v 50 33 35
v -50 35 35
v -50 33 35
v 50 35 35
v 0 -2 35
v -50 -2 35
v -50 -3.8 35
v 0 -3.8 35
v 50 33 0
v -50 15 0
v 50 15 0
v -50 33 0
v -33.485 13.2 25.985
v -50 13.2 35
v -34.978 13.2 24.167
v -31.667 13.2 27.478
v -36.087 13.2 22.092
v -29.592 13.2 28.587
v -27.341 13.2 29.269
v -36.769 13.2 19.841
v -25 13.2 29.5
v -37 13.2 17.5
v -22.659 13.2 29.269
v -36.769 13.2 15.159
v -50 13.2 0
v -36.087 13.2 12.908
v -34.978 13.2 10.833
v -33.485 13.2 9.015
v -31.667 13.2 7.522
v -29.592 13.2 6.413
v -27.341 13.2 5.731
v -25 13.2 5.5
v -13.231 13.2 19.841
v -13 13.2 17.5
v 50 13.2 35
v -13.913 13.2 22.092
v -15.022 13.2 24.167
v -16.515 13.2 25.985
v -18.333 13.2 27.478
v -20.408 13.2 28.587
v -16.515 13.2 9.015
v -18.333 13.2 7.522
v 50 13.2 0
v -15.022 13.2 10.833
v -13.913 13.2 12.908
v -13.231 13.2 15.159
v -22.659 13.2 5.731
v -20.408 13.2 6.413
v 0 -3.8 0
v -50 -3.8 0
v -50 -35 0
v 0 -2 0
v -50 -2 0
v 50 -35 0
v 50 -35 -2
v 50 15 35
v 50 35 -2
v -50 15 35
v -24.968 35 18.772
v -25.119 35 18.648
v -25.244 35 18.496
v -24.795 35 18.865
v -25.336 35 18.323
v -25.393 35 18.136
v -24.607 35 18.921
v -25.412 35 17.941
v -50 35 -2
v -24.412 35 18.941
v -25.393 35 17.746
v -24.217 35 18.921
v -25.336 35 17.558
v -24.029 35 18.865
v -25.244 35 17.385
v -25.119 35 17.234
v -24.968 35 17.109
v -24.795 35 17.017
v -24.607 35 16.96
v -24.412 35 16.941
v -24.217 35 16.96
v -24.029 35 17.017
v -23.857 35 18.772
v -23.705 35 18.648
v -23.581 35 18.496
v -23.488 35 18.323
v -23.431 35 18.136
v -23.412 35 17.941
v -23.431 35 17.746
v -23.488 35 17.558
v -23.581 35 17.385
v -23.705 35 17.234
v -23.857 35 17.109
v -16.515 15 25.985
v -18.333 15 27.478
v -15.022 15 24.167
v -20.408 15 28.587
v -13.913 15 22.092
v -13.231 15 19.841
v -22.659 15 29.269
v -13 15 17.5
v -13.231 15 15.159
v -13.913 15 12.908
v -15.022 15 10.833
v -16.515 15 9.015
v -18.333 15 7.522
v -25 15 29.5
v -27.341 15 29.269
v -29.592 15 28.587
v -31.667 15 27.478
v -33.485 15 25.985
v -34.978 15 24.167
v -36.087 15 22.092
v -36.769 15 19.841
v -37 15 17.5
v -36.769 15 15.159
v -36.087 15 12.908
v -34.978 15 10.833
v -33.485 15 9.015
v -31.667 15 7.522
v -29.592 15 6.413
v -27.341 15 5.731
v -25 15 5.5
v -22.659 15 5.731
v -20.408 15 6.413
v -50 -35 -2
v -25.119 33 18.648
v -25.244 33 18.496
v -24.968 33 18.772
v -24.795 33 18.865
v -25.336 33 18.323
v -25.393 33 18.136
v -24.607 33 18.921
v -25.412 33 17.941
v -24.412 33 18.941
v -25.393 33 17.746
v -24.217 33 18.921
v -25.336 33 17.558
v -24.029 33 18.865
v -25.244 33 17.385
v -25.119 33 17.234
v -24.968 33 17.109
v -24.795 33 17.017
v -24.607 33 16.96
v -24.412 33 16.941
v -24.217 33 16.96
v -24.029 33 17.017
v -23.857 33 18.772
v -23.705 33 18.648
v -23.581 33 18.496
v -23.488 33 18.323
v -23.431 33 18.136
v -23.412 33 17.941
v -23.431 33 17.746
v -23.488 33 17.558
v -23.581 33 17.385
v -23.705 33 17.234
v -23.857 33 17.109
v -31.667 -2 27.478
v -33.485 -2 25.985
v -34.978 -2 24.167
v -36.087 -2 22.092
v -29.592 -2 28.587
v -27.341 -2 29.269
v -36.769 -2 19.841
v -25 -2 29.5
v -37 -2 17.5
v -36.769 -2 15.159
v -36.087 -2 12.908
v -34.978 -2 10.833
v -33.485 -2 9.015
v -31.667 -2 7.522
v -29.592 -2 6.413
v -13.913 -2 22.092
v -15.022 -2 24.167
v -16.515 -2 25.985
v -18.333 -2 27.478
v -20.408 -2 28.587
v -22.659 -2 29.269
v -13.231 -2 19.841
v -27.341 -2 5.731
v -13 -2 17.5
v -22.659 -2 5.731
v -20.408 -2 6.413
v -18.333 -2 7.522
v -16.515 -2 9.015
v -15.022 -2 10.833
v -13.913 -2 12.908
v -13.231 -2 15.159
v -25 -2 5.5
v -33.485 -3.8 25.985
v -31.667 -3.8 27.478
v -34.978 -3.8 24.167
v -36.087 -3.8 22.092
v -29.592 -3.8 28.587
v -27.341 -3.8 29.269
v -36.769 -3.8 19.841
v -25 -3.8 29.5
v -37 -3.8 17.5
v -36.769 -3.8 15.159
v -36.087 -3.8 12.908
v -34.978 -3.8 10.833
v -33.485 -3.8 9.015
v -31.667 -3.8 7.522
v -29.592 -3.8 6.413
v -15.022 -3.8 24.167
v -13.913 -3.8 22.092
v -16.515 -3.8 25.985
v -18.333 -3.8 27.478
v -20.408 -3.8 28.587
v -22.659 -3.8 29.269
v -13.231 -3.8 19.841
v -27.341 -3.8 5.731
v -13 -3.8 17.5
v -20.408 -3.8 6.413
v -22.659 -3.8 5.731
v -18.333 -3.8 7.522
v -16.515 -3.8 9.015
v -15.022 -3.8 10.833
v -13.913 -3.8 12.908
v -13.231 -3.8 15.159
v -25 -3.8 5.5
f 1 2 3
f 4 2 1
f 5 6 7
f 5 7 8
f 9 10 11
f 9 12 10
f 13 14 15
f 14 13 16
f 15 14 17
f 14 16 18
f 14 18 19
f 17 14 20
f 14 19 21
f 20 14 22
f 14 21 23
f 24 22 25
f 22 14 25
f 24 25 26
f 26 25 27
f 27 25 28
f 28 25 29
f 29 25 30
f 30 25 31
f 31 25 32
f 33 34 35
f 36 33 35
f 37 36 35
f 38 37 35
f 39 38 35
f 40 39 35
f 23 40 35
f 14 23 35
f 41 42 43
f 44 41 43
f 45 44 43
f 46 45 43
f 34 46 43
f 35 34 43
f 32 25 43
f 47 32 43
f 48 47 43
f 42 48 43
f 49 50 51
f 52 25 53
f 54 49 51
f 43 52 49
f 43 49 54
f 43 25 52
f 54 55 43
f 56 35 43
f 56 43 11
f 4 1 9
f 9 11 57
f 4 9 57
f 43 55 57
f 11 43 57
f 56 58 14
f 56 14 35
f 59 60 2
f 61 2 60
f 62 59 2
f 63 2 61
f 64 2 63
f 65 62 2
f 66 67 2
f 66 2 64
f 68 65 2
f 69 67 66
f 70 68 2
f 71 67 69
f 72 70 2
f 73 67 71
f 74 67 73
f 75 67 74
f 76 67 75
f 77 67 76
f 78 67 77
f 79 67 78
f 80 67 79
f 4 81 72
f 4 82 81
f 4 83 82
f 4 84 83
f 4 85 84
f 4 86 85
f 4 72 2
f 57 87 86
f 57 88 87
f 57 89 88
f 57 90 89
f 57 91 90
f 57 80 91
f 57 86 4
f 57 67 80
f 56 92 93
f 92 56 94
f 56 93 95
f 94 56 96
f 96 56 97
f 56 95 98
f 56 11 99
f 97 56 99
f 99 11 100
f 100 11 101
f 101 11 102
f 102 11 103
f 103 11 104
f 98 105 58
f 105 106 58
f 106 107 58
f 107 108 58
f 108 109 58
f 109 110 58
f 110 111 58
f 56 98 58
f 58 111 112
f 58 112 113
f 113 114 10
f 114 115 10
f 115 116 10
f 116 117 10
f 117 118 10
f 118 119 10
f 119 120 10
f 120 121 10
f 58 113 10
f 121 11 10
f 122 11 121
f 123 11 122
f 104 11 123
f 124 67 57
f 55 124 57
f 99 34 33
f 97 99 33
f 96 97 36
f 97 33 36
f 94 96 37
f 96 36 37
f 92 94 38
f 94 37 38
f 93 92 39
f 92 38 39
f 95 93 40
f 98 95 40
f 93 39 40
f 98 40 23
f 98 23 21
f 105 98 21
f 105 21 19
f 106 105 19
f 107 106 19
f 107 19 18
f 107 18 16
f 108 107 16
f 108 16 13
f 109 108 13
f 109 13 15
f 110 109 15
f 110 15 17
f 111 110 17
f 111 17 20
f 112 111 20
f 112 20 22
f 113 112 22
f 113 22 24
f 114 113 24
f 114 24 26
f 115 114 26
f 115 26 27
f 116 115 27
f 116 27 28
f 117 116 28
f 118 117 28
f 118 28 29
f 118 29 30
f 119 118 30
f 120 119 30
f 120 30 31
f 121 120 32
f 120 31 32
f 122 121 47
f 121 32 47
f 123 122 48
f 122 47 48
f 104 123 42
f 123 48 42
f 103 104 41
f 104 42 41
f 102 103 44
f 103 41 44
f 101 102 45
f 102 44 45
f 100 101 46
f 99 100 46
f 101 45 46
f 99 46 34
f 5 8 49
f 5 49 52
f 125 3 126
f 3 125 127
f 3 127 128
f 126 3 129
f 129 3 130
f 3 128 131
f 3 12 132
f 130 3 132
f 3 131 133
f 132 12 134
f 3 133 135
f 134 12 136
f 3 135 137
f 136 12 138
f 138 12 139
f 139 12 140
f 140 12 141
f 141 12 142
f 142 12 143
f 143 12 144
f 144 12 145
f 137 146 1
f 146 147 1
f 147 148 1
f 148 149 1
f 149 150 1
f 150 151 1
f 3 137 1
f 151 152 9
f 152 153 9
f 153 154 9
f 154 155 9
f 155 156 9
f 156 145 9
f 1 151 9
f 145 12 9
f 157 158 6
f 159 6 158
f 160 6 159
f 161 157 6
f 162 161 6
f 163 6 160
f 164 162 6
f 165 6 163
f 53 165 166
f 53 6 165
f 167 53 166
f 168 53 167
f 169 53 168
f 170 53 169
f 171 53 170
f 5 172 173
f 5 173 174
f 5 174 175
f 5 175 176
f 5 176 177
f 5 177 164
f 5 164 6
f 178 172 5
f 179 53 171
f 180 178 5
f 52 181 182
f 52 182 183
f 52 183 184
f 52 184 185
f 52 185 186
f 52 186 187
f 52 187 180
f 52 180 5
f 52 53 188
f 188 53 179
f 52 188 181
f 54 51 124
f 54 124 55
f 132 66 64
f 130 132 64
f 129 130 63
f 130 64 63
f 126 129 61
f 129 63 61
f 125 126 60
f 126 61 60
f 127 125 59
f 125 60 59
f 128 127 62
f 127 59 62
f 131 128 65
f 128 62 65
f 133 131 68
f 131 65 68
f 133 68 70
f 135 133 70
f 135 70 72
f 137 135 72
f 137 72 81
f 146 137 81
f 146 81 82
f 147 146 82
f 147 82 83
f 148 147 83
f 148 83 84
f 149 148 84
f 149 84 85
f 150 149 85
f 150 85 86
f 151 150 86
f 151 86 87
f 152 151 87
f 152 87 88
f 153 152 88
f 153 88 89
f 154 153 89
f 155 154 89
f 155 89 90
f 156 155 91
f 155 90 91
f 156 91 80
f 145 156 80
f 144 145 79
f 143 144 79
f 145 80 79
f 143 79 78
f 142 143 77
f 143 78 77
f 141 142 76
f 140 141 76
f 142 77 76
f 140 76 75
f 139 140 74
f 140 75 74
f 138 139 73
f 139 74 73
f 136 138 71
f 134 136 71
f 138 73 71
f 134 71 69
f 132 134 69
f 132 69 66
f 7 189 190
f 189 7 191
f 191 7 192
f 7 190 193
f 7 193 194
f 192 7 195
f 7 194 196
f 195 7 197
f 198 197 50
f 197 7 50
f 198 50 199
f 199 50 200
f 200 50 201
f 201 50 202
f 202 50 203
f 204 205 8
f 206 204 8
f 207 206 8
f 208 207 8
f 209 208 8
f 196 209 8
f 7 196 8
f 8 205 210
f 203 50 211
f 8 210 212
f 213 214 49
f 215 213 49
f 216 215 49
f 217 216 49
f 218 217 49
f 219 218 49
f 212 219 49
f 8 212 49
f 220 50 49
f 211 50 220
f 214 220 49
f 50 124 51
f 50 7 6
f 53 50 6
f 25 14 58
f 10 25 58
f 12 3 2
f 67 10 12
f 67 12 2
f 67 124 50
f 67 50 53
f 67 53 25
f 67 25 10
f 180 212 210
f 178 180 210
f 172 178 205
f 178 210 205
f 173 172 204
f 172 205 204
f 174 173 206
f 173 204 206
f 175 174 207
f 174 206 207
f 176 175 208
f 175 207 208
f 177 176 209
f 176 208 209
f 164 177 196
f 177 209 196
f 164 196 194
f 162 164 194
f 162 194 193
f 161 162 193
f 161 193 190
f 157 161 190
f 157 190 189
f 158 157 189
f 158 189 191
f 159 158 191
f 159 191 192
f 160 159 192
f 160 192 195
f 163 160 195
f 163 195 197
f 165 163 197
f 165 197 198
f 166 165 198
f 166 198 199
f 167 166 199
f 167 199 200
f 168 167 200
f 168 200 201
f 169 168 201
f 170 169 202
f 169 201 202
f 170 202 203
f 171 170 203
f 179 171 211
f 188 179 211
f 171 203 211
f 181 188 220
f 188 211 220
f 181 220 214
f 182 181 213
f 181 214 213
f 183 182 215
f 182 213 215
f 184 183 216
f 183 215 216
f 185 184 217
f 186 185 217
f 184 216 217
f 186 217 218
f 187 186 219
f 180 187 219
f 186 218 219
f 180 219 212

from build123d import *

# Parameters (mm, degrees)
F0_W     = 100
F0_H     = 70
F1_DEPTH = 2
F2_W     = 100
F2_H     = 2
F2_W_2   = 50
F2_H_2   = 1.8
F3_DEPTH = 35
F4_R     = 12
F5_DEPTH = 25
F6_R     = 1
F7_DEPTH = 5.1


with BuildPart() as f1:
    # F0 (on Top) → F1 (new body)
    with BuildSketch(Plane.XY):
        Rectangle(F0_W, F0_H)
    extrude(amount=-F1_DEPTH)

    # F2 (on face) → F3 (join)
    with BuildSketch(Plane.XY):
        with Locations((0, 34)):
            Rectangle(F2_W, F2_H)
        with Locations((-25, 14.1)):
            Rectangle(F2_W_2, F2_H_2)
        with Locations((-25, -2.9)):
            Rectangle(F2_W_2, F2_H_2)
        with Locations((25, 14.1)):
            Rectangle(F2_W_2, F2_H_2)
    extrude(amount=F3_DEPTH)

    # F4 (on face) → F5 (cut)
    with BuildSketch(Plane.XZ.offset(3.8)):
        with Locations((-25, 17.5)):
            Circle(F4_R)
    extrude(amount=-F5_DEPTH, mode=Mode.SUBTRACT)

    # F6 (on face) → F7 (cut)
    with BuildSketch(Plane(origin=(0, 35, 0), x_dir=(-1, 0, 0), z_dir=(0, 1, 0))):
        with Locations((24.412103, 17.940653)):
            Circle(F6_R)
    extrude(amount=-F7_DEPTH, mode=Mode.SUBTRACT)


solid = f1.part
